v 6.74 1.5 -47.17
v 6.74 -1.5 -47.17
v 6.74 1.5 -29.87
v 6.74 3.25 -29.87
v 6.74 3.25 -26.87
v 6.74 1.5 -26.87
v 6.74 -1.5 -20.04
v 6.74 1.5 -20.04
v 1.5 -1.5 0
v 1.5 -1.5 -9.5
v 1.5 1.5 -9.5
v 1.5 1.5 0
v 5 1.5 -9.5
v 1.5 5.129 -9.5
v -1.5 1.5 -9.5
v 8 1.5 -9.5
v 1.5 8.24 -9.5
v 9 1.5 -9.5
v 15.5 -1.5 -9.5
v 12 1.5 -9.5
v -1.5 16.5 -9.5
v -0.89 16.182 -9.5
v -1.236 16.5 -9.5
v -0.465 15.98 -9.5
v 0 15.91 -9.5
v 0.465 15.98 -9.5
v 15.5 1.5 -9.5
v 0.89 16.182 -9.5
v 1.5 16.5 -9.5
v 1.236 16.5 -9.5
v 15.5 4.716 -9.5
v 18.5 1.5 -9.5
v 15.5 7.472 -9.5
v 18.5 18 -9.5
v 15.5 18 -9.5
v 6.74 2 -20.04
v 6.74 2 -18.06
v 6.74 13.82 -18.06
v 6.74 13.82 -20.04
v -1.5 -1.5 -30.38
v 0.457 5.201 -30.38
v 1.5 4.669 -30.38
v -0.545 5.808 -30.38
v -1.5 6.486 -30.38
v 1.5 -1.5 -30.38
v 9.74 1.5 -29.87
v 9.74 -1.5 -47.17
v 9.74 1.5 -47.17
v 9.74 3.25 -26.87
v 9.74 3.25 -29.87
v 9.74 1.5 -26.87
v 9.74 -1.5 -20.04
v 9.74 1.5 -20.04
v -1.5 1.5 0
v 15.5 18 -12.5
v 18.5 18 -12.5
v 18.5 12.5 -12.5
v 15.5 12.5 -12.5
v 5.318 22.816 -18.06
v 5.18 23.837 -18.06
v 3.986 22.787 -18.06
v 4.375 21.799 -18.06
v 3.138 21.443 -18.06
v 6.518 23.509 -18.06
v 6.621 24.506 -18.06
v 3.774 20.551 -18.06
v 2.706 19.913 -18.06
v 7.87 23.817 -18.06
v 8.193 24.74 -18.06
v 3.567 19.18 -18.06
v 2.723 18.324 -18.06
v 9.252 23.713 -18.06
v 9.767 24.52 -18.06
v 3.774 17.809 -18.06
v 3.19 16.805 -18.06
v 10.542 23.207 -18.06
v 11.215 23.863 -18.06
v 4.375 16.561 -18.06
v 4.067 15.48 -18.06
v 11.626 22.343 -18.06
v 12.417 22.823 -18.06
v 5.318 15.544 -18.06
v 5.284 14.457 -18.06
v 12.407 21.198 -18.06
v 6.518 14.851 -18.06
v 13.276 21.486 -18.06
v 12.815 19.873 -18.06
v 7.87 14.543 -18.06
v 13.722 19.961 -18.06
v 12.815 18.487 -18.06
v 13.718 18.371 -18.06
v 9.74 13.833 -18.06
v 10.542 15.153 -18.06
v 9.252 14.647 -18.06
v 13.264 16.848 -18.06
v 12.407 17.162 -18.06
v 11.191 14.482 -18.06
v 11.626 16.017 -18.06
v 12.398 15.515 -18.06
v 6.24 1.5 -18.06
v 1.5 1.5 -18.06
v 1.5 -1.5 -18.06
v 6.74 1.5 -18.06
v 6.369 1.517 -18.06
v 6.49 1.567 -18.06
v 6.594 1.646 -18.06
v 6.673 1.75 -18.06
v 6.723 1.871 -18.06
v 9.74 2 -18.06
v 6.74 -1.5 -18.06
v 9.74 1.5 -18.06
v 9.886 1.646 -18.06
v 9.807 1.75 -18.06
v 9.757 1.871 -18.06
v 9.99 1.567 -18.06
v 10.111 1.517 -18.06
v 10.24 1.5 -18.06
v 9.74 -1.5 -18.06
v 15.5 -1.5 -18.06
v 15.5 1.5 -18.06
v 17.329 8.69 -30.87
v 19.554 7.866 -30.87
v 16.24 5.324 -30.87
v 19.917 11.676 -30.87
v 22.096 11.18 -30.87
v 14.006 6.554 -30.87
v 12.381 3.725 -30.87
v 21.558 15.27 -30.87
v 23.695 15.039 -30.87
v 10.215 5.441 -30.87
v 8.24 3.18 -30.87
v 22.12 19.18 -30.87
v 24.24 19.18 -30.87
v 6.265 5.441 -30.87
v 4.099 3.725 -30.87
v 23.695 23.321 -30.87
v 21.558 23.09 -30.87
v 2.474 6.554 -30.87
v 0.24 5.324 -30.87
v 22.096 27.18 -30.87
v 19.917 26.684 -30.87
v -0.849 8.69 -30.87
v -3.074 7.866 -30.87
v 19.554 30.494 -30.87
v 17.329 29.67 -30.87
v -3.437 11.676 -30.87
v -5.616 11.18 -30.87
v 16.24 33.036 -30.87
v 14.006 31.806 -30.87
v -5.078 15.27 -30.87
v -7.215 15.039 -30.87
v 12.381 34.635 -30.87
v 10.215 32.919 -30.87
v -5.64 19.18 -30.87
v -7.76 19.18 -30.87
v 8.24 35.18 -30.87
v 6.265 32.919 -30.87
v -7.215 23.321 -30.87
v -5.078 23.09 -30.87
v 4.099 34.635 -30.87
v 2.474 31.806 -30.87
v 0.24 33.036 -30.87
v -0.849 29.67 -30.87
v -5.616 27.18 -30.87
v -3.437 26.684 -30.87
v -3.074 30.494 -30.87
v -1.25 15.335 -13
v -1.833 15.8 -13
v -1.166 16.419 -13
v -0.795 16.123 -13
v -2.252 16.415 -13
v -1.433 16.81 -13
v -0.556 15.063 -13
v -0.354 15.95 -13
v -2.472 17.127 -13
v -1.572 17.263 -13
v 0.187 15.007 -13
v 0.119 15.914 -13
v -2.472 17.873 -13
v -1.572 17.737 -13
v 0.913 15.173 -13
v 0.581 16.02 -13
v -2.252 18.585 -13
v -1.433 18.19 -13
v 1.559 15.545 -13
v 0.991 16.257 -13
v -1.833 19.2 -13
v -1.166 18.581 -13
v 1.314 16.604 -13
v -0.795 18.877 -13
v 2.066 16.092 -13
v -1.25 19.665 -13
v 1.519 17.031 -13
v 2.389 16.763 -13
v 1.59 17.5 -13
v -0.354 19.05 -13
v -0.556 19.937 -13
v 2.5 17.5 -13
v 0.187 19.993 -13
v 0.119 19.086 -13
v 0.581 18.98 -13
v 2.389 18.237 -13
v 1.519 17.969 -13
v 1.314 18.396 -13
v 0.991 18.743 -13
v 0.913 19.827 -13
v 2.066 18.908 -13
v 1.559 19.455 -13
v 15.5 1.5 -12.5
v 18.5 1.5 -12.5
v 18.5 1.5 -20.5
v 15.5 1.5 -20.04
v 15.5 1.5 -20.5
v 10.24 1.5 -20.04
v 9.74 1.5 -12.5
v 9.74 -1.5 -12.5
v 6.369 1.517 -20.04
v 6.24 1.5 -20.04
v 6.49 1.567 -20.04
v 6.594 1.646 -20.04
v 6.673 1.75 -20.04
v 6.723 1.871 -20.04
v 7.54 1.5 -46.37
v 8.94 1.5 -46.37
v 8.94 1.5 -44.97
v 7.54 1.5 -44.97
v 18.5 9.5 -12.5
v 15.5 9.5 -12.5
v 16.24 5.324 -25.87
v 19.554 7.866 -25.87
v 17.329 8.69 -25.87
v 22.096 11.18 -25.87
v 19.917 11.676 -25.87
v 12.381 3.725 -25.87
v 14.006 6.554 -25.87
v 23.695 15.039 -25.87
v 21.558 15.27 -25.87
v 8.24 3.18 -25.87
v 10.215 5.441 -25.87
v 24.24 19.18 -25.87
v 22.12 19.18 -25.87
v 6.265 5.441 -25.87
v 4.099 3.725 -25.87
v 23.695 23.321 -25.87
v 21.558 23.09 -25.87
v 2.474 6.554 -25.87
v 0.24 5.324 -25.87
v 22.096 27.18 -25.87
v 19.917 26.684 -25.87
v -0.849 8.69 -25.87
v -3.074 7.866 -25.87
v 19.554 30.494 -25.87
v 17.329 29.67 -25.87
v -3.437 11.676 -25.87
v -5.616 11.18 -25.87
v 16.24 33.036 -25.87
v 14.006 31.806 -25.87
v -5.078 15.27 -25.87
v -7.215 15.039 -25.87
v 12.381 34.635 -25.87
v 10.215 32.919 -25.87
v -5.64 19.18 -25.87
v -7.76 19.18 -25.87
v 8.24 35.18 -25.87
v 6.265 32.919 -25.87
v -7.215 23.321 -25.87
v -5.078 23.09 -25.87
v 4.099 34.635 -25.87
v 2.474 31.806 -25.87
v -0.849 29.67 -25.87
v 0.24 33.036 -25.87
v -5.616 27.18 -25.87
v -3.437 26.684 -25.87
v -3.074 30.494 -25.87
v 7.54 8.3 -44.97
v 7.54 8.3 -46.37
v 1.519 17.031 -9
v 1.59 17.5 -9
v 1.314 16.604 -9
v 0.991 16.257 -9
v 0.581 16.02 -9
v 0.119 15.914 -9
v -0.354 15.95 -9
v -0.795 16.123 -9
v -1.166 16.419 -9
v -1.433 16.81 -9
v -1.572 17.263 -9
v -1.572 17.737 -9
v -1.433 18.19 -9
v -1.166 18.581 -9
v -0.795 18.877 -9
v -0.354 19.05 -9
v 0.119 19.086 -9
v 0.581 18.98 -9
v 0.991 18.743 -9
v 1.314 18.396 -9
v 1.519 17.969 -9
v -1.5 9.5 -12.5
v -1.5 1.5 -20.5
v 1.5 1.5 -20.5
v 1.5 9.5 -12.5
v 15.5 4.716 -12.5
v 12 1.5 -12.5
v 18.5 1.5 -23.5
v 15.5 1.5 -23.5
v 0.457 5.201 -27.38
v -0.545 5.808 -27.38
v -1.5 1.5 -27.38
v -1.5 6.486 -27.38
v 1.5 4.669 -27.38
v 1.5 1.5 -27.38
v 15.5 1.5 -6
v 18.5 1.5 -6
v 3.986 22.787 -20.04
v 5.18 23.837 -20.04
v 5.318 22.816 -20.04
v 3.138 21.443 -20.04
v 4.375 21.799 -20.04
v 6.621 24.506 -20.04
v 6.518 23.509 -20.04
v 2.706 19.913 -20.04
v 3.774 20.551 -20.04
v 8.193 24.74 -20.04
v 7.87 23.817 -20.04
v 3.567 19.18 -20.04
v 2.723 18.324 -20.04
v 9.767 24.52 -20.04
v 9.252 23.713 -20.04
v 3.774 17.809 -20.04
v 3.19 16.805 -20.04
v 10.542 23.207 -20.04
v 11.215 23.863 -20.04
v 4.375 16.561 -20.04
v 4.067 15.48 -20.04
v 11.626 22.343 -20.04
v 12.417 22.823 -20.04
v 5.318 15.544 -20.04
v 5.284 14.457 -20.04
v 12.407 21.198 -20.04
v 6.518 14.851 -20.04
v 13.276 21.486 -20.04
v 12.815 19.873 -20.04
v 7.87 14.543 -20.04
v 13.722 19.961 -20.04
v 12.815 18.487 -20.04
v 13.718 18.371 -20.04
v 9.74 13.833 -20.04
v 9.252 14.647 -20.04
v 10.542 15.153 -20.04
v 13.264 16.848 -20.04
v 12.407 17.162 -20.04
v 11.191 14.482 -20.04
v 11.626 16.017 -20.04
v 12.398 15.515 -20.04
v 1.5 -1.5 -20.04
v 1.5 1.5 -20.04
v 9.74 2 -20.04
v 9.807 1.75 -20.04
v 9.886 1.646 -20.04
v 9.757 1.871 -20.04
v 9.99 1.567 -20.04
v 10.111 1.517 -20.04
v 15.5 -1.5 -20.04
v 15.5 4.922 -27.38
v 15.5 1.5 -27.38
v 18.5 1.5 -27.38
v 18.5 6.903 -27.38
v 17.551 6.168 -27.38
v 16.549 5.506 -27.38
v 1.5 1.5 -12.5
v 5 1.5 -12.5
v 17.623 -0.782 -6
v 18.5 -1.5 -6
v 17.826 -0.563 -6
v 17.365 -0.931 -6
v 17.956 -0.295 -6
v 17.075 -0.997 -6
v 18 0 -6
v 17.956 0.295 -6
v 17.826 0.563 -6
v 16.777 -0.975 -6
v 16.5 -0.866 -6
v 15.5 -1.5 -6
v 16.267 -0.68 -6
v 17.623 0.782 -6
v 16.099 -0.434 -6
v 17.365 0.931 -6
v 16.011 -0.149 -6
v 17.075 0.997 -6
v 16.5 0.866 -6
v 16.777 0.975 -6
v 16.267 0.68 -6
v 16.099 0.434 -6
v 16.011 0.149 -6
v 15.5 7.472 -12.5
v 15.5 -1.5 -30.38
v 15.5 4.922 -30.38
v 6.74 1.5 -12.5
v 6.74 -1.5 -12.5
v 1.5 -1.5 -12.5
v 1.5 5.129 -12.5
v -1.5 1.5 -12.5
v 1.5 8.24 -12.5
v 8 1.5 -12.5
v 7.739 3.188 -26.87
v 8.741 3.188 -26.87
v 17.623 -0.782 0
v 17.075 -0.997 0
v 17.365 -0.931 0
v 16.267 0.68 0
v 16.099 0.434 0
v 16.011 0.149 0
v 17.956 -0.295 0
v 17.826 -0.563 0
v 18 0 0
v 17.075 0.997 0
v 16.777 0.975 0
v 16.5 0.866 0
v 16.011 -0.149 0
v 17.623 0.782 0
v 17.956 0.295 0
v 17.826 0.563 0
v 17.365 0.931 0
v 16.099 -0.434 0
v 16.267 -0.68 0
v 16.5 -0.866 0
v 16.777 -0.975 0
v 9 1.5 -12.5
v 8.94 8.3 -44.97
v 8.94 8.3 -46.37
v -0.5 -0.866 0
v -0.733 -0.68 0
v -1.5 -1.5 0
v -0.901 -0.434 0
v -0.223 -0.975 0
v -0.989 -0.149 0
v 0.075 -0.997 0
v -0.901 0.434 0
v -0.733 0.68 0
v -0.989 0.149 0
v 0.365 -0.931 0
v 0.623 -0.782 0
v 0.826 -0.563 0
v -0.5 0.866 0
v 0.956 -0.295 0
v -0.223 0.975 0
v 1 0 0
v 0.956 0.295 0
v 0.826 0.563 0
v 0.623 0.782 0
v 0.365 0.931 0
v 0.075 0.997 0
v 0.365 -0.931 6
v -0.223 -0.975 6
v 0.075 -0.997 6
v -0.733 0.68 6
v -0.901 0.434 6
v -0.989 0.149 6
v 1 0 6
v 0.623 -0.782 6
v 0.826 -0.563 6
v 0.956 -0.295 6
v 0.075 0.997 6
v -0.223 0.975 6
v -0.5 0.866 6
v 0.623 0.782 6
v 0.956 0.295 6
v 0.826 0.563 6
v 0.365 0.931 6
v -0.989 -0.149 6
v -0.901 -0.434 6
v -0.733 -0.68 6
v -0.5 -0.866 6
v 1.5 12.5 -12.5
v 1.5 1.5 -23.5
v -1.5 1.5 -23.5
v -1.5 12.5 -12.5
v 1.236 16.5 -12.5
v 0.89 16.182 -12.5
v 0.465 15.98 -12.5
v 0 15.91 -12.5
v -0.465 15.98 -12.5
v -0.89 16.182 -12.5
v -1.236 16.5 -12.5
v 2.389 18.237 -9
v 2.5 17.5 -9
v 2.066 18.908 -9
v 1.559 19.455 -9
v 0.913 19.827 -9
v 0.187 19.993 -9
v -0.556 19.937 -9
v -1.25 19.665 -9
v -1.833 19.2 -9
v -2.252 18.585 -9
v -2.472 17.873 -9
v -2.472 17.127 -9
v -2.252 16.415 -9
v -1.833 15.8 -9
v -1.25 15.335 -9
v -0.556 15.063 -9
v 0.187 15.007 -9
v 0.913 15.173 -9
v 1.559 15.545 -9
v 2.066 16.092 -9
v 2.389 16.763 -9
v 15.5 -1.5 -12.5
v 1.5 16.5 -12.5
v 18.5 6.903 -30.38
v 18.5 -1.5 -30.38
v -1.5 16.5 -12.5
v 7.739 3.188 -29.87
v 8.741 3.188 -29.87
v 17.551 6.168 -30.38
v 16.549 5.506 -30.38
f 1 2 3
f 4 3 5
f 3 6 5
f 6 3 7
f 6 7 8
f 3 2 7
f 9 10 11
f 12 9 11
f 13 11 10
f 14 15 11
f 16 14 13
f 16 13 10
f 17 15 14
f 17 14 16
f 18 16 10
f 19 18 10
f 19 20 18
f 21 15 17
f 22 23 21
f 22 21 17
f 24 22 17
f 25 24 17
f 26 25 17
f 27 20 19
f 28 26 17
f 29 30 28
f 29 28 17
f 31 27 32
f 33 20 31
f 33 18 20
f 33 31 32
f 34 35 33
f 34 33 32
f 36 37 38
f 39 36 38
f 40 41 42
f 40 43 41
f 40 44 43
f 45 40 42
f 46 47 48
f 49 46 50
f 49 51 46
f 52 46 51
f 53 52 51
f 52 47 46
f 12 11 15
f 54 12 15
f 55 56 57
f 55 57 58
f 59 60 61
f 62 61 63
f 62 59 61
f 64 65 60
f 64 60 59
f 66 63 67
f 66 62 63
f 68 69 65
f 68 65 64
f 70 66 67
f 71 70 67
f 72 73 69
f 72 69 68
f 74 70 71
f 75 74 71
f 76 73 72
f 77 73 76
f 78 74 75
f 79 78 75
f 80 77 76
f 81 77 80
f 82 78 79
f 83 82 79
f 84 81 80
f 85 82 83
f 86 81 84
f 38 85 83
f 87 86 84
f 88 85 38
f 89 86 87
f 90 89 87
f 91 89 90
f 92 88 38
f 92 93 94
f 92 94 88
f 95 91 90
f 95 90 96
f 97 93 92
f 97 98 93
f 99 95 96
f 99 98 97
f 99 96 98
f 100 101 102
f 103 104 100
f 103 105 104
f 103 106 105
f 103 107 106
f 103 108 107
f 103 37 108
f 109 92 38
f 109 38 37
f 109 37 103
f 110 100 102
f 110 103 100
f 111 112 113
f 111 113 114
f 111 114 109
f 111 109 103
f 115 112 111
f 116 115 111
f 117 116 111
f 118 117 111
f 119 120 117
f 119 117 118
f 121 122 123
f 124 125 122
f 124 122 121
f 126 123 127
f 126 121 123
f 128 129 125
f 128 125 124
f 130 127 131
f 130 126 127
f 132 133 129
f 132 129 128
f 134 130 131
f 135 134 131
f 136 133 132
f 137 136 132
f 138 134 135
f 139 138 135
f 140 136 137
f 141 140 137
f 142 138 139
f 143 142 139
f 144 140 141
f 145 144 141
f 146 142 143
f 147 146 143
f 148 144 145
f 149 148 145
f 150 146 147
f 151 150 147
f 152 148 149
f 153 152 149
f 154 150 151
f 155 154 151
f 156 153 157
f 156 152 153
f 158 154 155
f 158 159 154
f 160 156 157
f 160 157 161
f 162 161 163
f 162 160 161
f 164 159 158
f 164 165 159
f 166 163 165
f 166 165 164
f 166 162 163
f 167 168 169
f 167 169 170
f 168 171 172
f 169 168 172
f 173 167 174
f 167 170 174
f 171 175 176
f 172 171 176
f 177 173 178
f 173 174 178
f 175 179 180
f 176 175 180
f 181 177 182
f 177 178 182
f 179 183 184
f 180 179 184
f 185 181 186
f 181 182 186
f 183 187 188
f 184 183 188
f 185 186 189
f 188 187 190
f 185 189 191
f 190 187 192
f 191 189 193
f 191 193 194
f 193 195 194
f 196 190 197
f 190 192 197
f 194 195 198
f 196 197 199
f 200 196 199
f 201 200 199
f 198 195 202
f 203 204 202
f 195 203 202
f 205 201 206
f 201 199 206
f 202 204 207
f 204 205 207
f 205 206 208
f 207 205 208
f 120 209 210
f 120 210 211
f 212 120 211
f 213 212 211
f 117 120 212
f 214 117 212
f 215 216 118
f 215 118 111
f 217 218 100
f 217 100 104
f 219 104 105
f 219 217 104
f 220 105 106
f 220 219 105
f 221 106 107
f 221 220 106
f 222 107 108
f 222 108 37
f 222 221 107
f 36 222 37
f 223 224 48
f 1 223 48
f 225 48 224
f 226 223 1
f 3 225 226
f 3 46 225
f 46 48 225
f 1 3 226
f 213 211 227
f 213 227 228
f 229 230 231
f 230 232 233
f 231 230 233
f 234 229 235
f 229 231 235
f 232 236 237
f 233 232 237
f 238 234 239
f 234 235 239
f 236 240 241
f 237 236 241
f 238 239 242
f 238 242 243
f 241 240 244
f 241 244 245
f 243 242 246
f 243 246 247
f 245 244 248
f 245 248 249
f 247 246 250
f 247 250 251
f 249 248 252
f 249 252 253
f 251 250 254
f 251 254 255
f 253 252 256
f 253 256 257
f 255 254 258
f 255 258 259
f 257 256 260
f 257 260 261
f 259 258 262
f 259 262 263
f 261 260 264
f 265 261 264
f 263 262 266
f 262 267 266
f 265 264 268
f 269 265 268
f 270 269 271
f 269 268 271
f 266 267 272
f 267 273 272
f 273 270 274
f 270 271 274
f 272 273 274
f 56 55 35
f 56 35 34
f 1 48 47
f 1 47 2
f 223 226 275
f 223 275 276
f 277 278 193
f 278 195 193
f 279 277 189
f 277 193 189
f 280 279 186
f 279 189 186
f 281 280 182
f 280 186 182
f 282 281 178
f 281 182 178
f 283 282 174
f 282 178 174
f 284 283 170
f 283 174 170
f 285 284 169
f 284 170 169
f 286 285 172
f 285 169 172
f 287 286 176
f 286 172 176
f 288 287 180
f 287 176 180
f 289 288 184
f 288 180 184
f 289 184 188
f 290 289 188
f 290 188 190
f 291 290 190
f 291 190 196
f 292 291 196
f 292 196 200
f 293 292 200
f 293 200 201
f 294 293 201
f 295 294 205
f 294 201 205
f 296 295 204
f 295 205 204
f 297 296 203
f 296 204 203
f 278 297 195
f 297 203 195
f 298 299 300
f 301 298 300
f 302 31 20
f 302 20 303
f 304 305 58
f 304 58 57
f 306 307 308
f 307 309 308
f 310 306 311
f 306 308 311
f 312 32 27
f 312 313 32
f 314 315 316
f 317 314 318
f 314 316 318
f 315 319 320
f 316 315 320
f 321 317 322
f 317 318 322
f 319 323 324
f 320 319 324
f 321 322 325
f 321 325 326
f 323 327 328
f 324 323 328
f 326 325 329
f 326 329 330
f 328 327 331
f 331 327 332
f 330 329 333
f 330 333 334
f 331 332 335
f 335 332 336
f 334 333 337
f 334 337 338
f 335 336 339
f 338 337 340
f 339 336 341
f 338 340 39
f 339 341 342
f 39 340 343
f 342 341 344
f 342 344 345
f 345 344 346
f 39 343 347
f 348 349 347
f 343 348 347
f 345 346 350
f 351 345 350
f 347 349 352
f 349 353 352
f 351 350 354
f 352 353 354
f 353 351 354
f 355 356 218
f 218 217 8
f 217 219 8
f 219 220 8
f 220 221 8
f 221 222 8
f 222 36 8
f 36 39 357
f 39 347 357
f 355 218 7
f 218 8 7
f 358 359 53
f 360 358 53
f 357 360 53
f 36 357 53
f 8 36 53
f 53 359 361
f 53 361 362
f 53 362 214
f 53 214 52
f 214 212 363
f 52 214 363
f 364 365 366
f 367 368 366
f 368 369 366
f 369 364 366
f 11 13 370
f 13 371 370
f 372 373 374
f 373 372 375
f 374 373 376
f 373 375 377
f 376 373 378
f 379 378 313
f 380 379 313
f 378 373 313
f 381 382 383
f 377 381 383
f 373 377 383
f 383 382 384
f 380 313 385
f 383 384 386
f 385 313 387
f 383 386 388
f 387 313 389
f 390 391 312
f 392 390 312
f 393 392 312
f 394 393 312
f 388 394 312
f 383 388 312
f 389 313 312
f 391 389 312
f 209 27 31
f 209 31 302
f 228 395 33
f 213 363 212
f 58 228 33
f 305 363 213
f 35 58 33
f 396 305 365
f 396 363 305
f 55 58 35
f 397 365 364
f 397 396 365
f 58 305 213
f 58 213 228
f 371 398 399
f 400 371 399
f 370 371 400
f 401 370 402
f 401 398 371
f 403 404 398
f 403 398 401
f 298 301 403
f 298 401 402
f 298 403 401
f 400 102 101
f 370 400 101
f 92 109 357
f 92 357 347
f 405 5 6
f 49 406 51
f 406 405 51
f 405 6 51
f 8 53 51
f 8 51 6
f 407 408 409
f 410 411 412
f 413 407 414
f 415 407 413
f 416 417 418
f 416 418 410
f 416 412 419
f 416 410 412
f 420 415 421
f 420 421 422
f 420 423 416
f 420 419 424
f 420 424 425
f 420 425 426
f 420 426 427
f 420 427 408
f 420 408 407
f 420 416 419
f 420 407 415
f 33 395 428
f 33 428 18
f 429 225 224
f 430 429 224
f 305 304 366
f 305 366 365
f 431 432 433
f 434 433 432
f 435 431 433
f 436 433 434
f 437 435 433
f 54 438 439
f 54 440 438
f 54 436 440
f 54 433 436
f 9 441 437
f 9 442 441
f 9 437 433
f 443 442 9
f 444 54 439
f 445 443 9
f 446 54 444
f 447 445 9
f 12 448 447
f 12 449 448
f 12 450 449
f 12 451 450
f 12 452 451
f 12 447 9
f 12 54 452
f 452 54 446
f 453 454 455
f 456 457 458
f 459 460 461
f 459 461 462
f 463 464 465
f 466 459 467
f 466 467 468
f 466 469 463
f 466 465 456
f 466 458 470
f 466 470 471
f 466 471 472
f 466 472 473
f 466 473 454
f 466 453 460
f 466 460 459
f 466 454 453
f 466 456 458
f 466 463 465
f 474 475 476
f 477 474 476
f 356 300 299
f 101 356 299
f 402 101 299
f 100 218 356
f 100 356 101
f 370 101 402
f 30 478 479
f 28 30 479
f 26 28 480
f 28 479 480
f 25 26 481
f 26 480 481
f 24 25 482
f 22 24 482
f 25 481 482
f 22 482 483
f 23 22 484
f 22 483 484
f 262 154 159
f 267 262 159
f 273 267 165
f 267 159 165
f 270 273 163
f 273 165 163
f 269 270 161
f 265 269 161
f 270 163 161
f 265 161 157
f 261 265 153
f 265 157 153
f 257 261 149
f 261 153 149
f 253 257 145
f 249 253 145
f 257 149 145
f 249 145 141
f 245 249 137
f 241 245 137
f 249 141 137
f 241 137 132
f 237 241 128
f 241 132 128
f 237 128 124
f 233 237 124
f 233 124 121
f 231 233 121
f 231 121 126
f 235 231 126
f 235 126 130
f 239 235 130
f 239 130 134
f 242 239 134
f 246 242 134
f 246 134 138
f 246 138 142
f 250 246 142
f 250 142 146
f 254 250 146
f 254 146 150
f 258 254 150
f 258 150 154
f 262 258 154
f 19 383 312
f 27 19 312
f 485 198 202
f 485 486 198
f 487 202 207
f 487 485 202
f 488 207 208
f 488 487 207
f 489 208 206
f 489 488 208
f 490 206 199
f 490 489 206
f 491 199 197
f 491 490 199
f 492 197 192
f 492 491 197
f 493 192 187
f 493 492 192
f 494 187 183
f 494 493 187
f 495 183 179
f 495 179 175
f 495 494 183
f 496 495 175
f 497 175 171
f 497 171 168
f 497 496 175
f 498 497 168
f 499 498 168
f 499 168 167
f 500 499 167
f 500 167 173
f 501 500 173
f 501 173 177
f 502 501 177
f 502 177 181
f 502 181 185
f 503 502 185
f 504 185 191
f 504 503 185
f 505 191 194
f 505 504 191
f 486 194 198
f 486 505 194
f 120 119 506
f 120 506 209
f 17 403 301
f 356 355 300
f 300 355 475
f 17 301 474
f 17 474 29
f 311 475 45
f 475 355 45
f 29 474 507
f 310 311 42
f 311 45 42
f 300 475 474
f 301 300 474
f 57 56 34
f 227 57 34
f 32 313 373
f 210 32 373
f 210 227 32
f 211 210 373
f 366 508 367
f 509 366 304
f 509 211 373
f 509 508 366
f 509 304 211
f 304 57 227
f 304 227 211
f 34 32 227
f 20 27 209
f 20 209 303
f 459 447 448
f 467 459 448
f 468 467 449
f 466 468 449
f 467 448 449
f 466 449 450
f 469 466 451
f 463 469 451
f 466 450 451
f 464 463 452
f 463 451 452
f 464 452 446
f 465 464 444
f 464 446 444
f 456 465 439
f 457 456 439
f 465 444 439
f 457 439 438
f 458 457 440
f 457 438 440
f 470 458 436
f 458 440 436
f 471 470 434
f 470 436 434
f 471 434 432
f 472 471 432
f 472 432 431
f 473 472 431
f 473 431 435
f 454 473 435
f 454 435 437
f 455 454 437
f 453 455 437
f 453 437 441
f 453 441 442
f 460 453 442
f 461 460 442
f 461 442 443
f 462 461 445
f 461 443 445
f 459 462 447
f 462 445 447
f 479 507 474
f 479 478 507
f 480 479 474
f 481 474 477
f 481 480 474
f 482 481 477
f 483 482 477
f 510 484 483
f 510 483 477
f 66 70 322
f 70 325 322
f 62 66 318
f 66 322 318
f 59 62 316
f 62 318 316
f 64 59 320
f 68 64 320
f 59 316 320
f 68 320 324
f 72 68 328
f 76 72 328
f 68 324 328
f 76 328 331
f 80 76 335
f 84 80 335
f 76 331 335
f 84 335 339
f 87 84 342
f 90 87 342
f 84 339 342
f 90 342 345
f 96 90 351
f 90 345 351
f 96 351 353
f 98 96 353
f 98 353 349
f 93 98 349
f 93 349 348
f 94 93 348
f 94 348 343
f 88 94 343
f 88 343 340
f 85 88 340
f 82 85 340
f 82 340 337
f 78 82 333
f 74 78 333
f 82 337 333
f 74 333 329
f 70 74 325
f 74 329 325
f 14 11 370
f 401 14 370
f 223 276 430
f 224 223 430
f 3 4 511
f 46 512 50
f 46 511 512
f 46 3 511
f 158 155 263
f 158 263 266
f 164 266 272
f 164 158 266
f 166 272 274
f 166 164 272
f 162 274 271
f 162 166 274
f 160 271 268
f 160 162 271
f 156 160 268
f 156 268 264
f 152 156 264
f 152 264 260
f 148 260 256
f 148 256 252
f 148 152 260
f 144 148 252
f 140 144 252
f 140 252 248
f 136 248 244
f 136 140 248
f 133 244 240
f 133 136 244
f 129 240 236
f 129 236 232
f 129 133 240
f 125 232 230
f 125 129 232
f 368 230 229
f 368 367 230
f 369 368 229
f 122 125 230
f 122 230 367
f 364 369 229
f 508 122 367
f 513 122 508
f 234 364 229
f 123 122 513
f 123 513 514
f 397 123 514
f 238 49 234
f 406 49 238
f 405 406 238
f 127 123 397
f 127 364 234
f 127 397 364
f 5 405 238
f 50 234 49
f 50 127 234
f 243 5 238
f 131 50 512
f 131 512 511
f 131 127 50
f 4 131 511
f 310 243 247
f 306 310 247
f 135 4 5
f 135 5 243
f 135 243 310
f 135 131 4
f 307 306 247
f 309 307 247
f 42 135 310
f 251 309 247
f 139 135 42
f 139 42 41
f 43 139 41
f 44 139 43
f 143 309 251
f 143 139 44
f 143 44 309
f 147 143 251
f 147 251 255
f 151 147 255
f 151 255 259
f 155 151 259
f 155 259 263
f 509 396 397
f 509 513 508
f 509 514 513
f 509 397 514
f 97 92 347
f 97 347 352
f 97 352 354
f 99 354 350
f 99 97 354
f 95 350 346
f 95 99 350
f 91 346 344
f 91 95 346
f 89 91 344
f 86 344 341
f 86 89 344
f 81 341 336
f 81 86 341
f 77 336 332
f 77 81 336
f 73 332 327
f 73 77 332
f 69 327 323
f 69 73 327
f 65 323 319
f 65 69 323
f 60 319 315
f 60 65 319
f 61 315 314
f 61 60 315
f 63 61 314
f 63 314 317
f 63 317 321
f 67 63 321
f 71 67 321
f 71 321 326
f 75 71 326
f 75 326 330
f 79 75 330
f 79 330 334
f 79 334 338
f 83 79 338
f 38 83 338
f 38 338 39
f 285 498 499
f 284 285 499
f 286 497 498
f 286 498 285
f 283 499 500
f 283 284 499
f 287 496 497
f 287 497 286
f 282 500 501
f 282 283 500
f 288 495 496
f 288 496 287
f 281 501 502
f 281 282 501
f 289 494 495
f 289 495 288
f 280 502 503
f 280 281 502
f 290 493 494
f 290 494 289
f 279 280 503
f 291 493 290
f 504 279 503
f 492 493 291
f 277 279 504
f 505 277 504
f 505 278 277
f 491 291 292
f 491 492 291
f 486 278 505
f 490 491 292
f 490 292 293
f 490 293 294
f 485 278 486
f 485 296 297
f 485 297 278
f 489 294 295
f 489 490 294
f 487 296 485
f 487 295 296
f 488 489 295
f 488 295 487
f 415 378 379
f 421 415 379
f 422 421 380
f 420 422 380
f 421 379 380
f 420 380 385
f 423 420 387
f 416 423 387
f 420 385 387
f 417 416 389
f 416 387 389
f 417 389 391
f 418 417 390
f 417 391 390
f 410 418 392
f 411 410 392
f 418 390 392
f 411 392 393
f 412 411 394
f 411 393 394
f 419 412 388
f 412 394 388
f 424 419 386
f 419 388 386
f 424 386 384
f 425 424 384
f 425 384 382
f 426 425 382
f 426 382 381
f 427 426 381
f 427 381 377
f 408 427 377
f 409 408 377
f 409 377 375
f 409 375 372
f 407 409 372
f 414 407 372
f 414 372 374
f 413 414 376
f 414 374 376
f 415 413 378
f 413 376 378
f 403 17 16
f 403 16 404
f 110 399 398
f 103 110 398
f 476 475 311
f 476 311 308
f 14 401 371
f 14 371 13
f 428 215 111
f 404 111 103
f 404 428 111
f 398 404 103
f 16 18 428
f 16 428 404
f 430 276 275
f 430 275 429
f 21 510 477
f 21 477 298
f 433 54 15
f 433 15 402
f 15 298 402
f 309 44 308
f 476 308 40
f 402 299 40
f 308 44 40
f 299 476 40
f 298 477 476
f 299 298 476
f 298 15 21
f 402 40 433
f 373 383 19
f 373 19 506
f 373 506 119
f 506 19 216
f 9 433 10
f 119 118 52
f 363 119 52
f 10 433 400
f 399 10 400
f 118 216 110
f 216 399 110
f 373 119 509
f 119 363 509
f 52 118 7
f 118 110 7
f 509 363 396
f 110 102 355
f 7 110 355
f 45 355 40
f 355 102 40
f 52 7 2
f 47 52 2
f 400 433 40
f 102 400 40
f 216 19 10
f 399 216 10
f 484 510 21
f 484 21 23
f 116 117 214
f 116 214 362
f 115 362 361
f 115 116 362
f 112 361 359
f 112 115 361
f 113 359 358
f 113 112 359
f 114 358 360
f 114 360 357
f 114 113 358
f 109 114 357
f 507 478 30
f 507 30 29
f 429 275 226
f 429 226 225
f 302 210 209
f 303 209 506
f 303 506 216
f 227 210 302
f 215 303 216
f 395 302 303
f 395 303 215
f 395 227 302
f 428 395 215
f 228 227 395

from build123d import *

# Parameters (mm, degrees)
SKETCH3_W            = 3
SKETCH3_H            = 3
SKETCH7_W            = 3
SKETCH7_H            = 3
BOSS_EXTRUDE1_DEPTH  = 16.5
SKETCH12_R           = 2.5
BOSS_EXTRUDE4_DEPTH  = 2
SKETCH17_R           = 1
BOSS_EXTRUDE5_DEPTH  = 6
SKETCH18_R           = 1
BOSS_EXTRUDE6_DEPTH  = 6
SKETCH19_W           = 3
SKETCH19_H           = 3
BOSS_EXTRUDE7_DEPTH  = 7.54
SKETCH21_W           = 3
SKETCH21_H           = 1.98
BOSS_EXTRUDE8_DEPTH  = 17.68
SKETCH22_R           = 5.56
BOSS_EXTRUDE9_DEPTH  = 0.99
SKETCH23_R           = 4.65
CUT_EXTRUDE2_DEPTH   = 2.5
SKETCH24_W           = 3
SKETCH24_H           = 3
BOSS_EXTRUDE10_DEPTH = 9.83
SKETCH25_W           = 3
SKETCH25_H           = 3
BOSS_EXTRUDE11_DEPTH = 3
SKETCH27_R           = 16
BOSS_EXTRUDE12_DEPTH = 2.5
SKETCH28_R           = 13.88
CUT_EXTRUDE3_DEPTH   = 7
SKETCH31_W           = 3
SKETCH31_H           = 3
BOSS_EXTRUDE13_DEPTH = 17.3
SKETCH32_W           = 1.4
SKETCH32_H           = 1.4
BOSS_EXTRUDE14_DEPTH = 6.8
SKETCH33_W           = 3
SKETCH33_H           = 3
BOSS_EXTRUDE15_DEPTH = 17.88
SKETCH34_W           = 3
SKETCH34_H           = 3
BOSS_EXTRUDE16_DEPTH = 5.5
SKETCH36_W           = 3
SKETCH36_H           = 3
SKETCH16_R           = 1.59
CUT_EXTRUDE7_DEPTH   = 5
SKETCH41_W           = 3
SKETCH41_H           = 3
BOSS_EXTRUDE17_DEPTH = 17.88
SKETCH42_W           = 3
SKETCH42_H           = 3
BOSS_EXTRUDE18_DEPTH = 5
SKETCH43_W           = 3
SKETCH43_H           = 3
BOSS_EXTRUDE19_DEPTH = 16.5
SKETCH47_W           = 3
SKETCH47_H           = 3
SKETCH53_W           = 3
SKETCH53_H           = 3
BOSS_EXTRUDE20_REACH = 63.391
SKETCH55_W           = 1.98
SKETCH55_H           = 3
BOSS_EXTRUDE21_REACH = 63.391
SKETCH56_W           = 1.98
SKETCH56_H           = 3
FILLET1_R            = 0.5
FILLET2_R            = 0.5


with BuildPart() as part:
    # Sweep3: sweep along a path in Sketch4
    with BuildLine(Plane(origin=(0, 0, 0), x_dir=(1, 0, 0), z_dir=(0, 1, 0))) as sweep3_path:
        Line((0, 0), (0, 11))
        Line((0, 11), (17, 11))
        Line((17, 11), (17, 6))
    # Sketch3 → Sweep3 (sweep)
    with BuildSketch(Plane.XY):
        Rectangle(SKETCH3_W, SKETCH3_H)
    sweep(path=sweep3_path.line, transition=Transition.RIGHT)

    # Sketch7 → Boss-Extrude1 (add)
    with BuildSketch(Plane(origin=(0, 0, 0), x_dir=(1, 0, 0), z_dir=(0, 1, 0))):
        with Locations((0, 11)):
            Rectangle(SKETCH7_W, SKETCH7_H)
    extrude(amount=BOSS_EXTRUDE1_DEPTH)

    # Sketch17 → Boss-Extrude5 (add)
    with BuildSketch(Plane.XY):
        Circle(SKETCH17_R)
    extrude(amount=BOSS_EXTRUDE5_DEPTH)

    # Sketch18 → Boss-Extrude6 (add)
    with BuildSketch(Plane.XY.offset(-6)):
        with Locations((17, 0)):
            Circle(SKETCH18_R)
    extrude(amount=BOSS_EXTRUDE6_DEPTH)

    # Sweep4: sweep along a path in Sketch39
    with BuildLine(Plane.XY.offset(-11)) as sweep4_path:
        Line((6.5, 1.5), (0, 8.24))
    # Sketch36 → Sweep4 (sweep)
    with BuildSketch(Plane(origin=(0, 1.5, 0), x_dir=(1, 0, 0), z_dir=(0, 1, 0))):
        with Locations((6.5, 11)):
            Rectangle(SKETCH36_W, SKETCH36_H)
    sweep(path=sweep4_path.line)


with BuildPart() as body_2:
    # Sketch12 → Boss-Extrude4 (new, symmetric)
    with BuildSketch(Plane.XY.offset(-11)):
        with Locations((0, 17.5)):
            Circle(SKETCH12_R)
    extrude(amount=BOSS_EXTRUDE4_DEPTH, both=True)


with BuildPart() as body_3:
    # Sketch19 → Boss-Extrude7 (new body)
    with BuildSketch(Plane.XY.offset(-12.5)):
        with Locations((8.24, 0)):
            Rectangle(SKETCH19_W, SKETCH19_H)
    extrude(amount=-BOSS_EXTRUDE7_DEPTH)

    # Sketch21 → Boss-Extrude8 (add)
    with BuildSketch(Plane(origin=(0, 1.5, 0), x_dir=(1, 0, 0), z_dir=(0, 1, 0))):
        with Locations((8.24, 19.05)):
            Rectangle(SKETCH21_W, SKETCH21_H)
    extrude(amount=BOSS_EXTRUDE8_DEPTH)

    # Sketch22 → Boss-Extrude9 (add, symmetric)
    with BuildSketch(Plane.XY.offset(-19.05)):
        with Locations((8.217064706, 19.179985124)):
            Circle(SKETCH22_R)
    extrude(amount=BOSS_EXTRUDE9_DEPTH, both=True)

    # Sketch23 → Cut-Extrude2 (cut, symmetric)
    with BuildSketch(Plane(origin=(0, 0, -20.04), x_dir=(-1, 0, 0), z_dir=(0, 0, -1))):
        with Locations((-8.217064706, 19.179985124)):
            Circle(SKETCH23_R)
    extrude(amount=CUT_EXTRUDE2_DEPTH, both=True, mode=Mode.SUBTRACT)

    # Sketch24 → Boss-Extrude10 (add)
    with BuildSketch(Plane(origin=(0, 0, -20.04), x_dir=(-1, 0, 0), z_dir=(0, 0, -1))):
        with Locations((-8.24, 0)):
            Rectangle(SKETCH24_W, SKETCH24_H)
    extrude(amount=BOSS_EXTRUDE10_DEPTH)

    # Sketch25 → Boss-Extrude11 (add)
    with BuildSketch(Plane(origin=(0, 1.5, 0), x_dir=(1, 0, 0), z_dir=(0, 1, 0))):
        with Locations((8.24, 28.37)):
            Rectangle(SKETCH25_W, SKETCH25_H)
    extrude(amount=BOSS_EXTRUDE11_DEPTH)

    # Sketch27 → Boss-Extrude12 (add, symmetric)
    with BuildSketch(Plane(origin=(0, 0, -28.37), x_dir=(-1, 0, 0), z_dir=(0, 0, -1))):
        with Locations((-8.24, 19.18)):
            Circle(SKETCH27_R)
    extrude(amount=BOSS_EXTRUDE12_DEPTH, both=True)

    # Sketch28 → Cut-Extrude3 (cut)
    with BuildSketch(Plane(origin=(0, 0, -30.87), x_dir=(-1, 0, 0), z_dir=(0, 0, -1))):
        with Locations((-8.24, 19.18)):
            Circle(SKETCH28_R)
    extrude(amount=-CUT_EXTRUDE3_DEPTH, mode=Mode.SUBTRACT)

    # Sketch31 → Boss-Extrude13 (add)
    with BuildSketch(Plane(origin=(0, 0, -29.87), x_dir=(-1, 0, 0), z_dir=(0, 0, -1))):
        with Locations((-8.24, 0)):
            Rectangle(SKETCH31_W, SKETCH31_H)
    extrude(amount=BOSS_EXTRUDE13_DEPTH)

    # Sketch32 → Boss-Extrude14 (add)
    with BuildSketch(Plane(origin=(0, 1.5, 0), x_dir=(1, 0, 0), z_dir=(0, 1, 0))):
        with Locations((8.24, 45.67)):
            Rectangle(SKETCH32_W, SKETCH32_H)
    extrude(amount=BOSS_EXTRUDE14_DEPTH)



with BuildPart() as body_4:
    # Sketch33 → Boss-Extrude15 (new body)
    with BuildSketch(Plane(origin=(0, 0, -12.5), x_dir=(-1, 0, 0), z_dir=(0, 0, -1))):
        with Locations((-17, 0)):
            Rectangle(SKETCH33_W, SKETCH33_H)
    extrude(amount=BOSS_EXTRUDE15_DEPTH)

    # Sketch34 → Boss-Extrude16 (add)
    with BuildSketch(Plane(origin=(0, 1.5, 0), x_dir=(1, 0, 0), z_dir=(0, 1, 0))):
        with Locations((17, 28.88)):
            Rectangle(SKETCH34_W, SKETCH34_H)
    extrude(amount=BOSS_EXTRUDE16_DEPTH)


with BuildPart() as cut_extrude7_tool:
    # Sketch16 → Cut-Extrude7 (new, symmetric)
    with BuildSketch(Plane(origin=(0, 0, -13), x_dir=(-1, 0, 0), z_dir=(0, 0, -1))):
        with Locations(Location((0, 17.5, 0), (0, 0, 180))):
            Circle(SKETCH16_R)
    extrude(amount=CUT_EXTRUDE7_DEPTH, both=True)


with BuildPart() as part_1:
    add(part.part)

    # Cut-Extrude7: cut by cut_extrude7_tool
    add(cut_extrude7_tool.part, mode=Mode.SUBTRACT)


with BuildPart() as body_2_1:
    add(body_2.part)

    # Cut-Extrude7: cut by cut_extrude7_tool
    add(cut_extrude7_tool.part, mode=Mode.SUBTRACT)


with BuildPart() as body_3_1:
    add(body_3.part)

    add(part_1.part)  # Boss-Extrude17 merges part
    # Sketch41 → Boss-Extrude17 (add)
    with BuildSketch(Plane(origin=(0, 0, -12.5), x_dir=(-1, 0, 0), z_dir=(0, 0, -1))):
        Rectangle(SKETCH41_W, SKETCH41_H)
    extrude(amount=BOSS_EXTRUDE17_DEPTH)

    # Sketch42 → Boss-Extrude18 (add)
    with BuildSketch(Plane(origin=(0, 1.5, 0), x_dir=(1, 0, 0), z_dir=(0, 1, 0))):
        with Locations((0, 28.88)):
            Rectangle(SKETCH42_W, SKETCH42_H)
    extrude(amount=BOSS_EXTRUDE18_DEPTH)


    add(body_4.part)  # Boss-Extrude19 merges body 4
    # Sketch43 → Boss-Extrude19 (add)
    with BuildSketch(Plane(origin=(0, 1.5, 0), x_dir=(1, 0, 0), z_dir=(0, 1, 0))):
        with Locations((17, 11)):
            Rectangle(SKETCH43_W, SKETCH43_H)
    extrude(amount=BOSS_EXTRUDE19_DEPTH)

    # Sweep5: sweep along a path in Sketch51
    with BuildLine(Plane.XY.offset(-11)) as sweep5_path:
        Line((10.5, 1.5), (17, 7.472026952))
    # Sketch47 → Sweep5 (sweep)
    with BuildSketch(Plane(origin=(0, 1.5, 0), x_dir=(1, 0, 0), z_dir=(0, 1, 0))):
        with Locations((10.5, 11)):
            Rectangle(SKETCH47_W, SKETCH47_H)
    sweep(path=sweep5_path.line)

    # Sweep6: sweep along a path in Sketch54
    with BuildLine(Plane.ZY.offset(1.5)) as sweep6_path:
        Line((-12.5, 11), (-23.5, 0))
    # Sketch53 → Sweep6 (sweep)
    with BuildSketch(Plane.XY.offset(-12.5)):
        with Locations((0, 11)):
            Rectangle(SKETCH53_W, SKETCH53_H)
    sweep6 = sweep(path=sweep6_path.line)

    # Mirror11: Sweep6 across plane
    add(sweep6.mirror(Plane.ZY.offset(-8.5)))

    # Sketch55 → Boss-Extrude20 (add, up to next)
    with BuildSketch(Plane.ZY.offset(-6.74), mode=Mode.PRIVATE) as boss_extrude20_sk1:
        with Locations((-19.05, 0)):
            Rectangle(SKETCH55_W, SKETCH55_H)
    boss_extrude20_tool1 = extrude(boss_extrude20_sk1.sketch, amount=BOSS_EXTRUDE20_REACH, mode=Mode.PRIVATE) - body_3_1.part
    add(boss_extrude20_tool1.solids().sort_by_distance((6.74, 0, -19.05))[0])

    # Sketch56 → Boss-Extrude21 (add, up to next)
    with BuildSketch(Plane(origin=(9.74, 0, 0), x_dir=(0, 0, -1), z_dir=(1, 0, 0)), mode=Mode.PRIVATE) as boss_extrude21_sk1:
        with Locations((19.05, 0)):
            Rectangle(SKETCH56_W, SKETCH56_H)
    boss_extrude21_tool1 = extrude(boss_extrude21_sk1.sketch, amount=BOSS_EXTRUDE21_REACH, mode=Mode.PRIVATE) - body_3_1.part
    add(boss_extrude21_tool1.solids().sort_by_distance((9.74, 0, -19.05))[0])

    # Fillet1
    # the kernel refuses this fillet: 0.5 mm, written as the material it adds along each edge
    with BuildSketch(Plane(origin=(6.74, 1.5, -20.04), x_dir=(-1, 0, 0), z_dir=(0, 0, 1))) as fillet1_piece_1:
        with BuildLine():
            CenterArc((FILLET1_R, -FILLET1_R), FILLET1_R, 90, 90)
            Line((0, -FILLET1_R), (0, 0))
            Line((0, 0), (FILLET1_R, 0))
        make_face()
    extrude(amount=1.98)

    # Fillet2
    # the kernel refuses this fillet: 0.5 mm, written as the material it adds along each edge
    with BuildSketch(Plane(origin=(9.74, 1.5, -18.06), x_dir=(0, 1, 0), z_dir=(0, 0, -1))) as fillet2_piece_1:
        with BuildLine():
            CenterArc((FILLET2_R, FILLET2_R), FILLET2_R, 180, 90)
            Line((0, FILLET2_R), (0, 0))
            Line((0, 0), (FILLET2_R, 0))
        make_face()
    extrude(amount=1.98)


solid = Compound([body_2_1.part, body_3_1.part])
